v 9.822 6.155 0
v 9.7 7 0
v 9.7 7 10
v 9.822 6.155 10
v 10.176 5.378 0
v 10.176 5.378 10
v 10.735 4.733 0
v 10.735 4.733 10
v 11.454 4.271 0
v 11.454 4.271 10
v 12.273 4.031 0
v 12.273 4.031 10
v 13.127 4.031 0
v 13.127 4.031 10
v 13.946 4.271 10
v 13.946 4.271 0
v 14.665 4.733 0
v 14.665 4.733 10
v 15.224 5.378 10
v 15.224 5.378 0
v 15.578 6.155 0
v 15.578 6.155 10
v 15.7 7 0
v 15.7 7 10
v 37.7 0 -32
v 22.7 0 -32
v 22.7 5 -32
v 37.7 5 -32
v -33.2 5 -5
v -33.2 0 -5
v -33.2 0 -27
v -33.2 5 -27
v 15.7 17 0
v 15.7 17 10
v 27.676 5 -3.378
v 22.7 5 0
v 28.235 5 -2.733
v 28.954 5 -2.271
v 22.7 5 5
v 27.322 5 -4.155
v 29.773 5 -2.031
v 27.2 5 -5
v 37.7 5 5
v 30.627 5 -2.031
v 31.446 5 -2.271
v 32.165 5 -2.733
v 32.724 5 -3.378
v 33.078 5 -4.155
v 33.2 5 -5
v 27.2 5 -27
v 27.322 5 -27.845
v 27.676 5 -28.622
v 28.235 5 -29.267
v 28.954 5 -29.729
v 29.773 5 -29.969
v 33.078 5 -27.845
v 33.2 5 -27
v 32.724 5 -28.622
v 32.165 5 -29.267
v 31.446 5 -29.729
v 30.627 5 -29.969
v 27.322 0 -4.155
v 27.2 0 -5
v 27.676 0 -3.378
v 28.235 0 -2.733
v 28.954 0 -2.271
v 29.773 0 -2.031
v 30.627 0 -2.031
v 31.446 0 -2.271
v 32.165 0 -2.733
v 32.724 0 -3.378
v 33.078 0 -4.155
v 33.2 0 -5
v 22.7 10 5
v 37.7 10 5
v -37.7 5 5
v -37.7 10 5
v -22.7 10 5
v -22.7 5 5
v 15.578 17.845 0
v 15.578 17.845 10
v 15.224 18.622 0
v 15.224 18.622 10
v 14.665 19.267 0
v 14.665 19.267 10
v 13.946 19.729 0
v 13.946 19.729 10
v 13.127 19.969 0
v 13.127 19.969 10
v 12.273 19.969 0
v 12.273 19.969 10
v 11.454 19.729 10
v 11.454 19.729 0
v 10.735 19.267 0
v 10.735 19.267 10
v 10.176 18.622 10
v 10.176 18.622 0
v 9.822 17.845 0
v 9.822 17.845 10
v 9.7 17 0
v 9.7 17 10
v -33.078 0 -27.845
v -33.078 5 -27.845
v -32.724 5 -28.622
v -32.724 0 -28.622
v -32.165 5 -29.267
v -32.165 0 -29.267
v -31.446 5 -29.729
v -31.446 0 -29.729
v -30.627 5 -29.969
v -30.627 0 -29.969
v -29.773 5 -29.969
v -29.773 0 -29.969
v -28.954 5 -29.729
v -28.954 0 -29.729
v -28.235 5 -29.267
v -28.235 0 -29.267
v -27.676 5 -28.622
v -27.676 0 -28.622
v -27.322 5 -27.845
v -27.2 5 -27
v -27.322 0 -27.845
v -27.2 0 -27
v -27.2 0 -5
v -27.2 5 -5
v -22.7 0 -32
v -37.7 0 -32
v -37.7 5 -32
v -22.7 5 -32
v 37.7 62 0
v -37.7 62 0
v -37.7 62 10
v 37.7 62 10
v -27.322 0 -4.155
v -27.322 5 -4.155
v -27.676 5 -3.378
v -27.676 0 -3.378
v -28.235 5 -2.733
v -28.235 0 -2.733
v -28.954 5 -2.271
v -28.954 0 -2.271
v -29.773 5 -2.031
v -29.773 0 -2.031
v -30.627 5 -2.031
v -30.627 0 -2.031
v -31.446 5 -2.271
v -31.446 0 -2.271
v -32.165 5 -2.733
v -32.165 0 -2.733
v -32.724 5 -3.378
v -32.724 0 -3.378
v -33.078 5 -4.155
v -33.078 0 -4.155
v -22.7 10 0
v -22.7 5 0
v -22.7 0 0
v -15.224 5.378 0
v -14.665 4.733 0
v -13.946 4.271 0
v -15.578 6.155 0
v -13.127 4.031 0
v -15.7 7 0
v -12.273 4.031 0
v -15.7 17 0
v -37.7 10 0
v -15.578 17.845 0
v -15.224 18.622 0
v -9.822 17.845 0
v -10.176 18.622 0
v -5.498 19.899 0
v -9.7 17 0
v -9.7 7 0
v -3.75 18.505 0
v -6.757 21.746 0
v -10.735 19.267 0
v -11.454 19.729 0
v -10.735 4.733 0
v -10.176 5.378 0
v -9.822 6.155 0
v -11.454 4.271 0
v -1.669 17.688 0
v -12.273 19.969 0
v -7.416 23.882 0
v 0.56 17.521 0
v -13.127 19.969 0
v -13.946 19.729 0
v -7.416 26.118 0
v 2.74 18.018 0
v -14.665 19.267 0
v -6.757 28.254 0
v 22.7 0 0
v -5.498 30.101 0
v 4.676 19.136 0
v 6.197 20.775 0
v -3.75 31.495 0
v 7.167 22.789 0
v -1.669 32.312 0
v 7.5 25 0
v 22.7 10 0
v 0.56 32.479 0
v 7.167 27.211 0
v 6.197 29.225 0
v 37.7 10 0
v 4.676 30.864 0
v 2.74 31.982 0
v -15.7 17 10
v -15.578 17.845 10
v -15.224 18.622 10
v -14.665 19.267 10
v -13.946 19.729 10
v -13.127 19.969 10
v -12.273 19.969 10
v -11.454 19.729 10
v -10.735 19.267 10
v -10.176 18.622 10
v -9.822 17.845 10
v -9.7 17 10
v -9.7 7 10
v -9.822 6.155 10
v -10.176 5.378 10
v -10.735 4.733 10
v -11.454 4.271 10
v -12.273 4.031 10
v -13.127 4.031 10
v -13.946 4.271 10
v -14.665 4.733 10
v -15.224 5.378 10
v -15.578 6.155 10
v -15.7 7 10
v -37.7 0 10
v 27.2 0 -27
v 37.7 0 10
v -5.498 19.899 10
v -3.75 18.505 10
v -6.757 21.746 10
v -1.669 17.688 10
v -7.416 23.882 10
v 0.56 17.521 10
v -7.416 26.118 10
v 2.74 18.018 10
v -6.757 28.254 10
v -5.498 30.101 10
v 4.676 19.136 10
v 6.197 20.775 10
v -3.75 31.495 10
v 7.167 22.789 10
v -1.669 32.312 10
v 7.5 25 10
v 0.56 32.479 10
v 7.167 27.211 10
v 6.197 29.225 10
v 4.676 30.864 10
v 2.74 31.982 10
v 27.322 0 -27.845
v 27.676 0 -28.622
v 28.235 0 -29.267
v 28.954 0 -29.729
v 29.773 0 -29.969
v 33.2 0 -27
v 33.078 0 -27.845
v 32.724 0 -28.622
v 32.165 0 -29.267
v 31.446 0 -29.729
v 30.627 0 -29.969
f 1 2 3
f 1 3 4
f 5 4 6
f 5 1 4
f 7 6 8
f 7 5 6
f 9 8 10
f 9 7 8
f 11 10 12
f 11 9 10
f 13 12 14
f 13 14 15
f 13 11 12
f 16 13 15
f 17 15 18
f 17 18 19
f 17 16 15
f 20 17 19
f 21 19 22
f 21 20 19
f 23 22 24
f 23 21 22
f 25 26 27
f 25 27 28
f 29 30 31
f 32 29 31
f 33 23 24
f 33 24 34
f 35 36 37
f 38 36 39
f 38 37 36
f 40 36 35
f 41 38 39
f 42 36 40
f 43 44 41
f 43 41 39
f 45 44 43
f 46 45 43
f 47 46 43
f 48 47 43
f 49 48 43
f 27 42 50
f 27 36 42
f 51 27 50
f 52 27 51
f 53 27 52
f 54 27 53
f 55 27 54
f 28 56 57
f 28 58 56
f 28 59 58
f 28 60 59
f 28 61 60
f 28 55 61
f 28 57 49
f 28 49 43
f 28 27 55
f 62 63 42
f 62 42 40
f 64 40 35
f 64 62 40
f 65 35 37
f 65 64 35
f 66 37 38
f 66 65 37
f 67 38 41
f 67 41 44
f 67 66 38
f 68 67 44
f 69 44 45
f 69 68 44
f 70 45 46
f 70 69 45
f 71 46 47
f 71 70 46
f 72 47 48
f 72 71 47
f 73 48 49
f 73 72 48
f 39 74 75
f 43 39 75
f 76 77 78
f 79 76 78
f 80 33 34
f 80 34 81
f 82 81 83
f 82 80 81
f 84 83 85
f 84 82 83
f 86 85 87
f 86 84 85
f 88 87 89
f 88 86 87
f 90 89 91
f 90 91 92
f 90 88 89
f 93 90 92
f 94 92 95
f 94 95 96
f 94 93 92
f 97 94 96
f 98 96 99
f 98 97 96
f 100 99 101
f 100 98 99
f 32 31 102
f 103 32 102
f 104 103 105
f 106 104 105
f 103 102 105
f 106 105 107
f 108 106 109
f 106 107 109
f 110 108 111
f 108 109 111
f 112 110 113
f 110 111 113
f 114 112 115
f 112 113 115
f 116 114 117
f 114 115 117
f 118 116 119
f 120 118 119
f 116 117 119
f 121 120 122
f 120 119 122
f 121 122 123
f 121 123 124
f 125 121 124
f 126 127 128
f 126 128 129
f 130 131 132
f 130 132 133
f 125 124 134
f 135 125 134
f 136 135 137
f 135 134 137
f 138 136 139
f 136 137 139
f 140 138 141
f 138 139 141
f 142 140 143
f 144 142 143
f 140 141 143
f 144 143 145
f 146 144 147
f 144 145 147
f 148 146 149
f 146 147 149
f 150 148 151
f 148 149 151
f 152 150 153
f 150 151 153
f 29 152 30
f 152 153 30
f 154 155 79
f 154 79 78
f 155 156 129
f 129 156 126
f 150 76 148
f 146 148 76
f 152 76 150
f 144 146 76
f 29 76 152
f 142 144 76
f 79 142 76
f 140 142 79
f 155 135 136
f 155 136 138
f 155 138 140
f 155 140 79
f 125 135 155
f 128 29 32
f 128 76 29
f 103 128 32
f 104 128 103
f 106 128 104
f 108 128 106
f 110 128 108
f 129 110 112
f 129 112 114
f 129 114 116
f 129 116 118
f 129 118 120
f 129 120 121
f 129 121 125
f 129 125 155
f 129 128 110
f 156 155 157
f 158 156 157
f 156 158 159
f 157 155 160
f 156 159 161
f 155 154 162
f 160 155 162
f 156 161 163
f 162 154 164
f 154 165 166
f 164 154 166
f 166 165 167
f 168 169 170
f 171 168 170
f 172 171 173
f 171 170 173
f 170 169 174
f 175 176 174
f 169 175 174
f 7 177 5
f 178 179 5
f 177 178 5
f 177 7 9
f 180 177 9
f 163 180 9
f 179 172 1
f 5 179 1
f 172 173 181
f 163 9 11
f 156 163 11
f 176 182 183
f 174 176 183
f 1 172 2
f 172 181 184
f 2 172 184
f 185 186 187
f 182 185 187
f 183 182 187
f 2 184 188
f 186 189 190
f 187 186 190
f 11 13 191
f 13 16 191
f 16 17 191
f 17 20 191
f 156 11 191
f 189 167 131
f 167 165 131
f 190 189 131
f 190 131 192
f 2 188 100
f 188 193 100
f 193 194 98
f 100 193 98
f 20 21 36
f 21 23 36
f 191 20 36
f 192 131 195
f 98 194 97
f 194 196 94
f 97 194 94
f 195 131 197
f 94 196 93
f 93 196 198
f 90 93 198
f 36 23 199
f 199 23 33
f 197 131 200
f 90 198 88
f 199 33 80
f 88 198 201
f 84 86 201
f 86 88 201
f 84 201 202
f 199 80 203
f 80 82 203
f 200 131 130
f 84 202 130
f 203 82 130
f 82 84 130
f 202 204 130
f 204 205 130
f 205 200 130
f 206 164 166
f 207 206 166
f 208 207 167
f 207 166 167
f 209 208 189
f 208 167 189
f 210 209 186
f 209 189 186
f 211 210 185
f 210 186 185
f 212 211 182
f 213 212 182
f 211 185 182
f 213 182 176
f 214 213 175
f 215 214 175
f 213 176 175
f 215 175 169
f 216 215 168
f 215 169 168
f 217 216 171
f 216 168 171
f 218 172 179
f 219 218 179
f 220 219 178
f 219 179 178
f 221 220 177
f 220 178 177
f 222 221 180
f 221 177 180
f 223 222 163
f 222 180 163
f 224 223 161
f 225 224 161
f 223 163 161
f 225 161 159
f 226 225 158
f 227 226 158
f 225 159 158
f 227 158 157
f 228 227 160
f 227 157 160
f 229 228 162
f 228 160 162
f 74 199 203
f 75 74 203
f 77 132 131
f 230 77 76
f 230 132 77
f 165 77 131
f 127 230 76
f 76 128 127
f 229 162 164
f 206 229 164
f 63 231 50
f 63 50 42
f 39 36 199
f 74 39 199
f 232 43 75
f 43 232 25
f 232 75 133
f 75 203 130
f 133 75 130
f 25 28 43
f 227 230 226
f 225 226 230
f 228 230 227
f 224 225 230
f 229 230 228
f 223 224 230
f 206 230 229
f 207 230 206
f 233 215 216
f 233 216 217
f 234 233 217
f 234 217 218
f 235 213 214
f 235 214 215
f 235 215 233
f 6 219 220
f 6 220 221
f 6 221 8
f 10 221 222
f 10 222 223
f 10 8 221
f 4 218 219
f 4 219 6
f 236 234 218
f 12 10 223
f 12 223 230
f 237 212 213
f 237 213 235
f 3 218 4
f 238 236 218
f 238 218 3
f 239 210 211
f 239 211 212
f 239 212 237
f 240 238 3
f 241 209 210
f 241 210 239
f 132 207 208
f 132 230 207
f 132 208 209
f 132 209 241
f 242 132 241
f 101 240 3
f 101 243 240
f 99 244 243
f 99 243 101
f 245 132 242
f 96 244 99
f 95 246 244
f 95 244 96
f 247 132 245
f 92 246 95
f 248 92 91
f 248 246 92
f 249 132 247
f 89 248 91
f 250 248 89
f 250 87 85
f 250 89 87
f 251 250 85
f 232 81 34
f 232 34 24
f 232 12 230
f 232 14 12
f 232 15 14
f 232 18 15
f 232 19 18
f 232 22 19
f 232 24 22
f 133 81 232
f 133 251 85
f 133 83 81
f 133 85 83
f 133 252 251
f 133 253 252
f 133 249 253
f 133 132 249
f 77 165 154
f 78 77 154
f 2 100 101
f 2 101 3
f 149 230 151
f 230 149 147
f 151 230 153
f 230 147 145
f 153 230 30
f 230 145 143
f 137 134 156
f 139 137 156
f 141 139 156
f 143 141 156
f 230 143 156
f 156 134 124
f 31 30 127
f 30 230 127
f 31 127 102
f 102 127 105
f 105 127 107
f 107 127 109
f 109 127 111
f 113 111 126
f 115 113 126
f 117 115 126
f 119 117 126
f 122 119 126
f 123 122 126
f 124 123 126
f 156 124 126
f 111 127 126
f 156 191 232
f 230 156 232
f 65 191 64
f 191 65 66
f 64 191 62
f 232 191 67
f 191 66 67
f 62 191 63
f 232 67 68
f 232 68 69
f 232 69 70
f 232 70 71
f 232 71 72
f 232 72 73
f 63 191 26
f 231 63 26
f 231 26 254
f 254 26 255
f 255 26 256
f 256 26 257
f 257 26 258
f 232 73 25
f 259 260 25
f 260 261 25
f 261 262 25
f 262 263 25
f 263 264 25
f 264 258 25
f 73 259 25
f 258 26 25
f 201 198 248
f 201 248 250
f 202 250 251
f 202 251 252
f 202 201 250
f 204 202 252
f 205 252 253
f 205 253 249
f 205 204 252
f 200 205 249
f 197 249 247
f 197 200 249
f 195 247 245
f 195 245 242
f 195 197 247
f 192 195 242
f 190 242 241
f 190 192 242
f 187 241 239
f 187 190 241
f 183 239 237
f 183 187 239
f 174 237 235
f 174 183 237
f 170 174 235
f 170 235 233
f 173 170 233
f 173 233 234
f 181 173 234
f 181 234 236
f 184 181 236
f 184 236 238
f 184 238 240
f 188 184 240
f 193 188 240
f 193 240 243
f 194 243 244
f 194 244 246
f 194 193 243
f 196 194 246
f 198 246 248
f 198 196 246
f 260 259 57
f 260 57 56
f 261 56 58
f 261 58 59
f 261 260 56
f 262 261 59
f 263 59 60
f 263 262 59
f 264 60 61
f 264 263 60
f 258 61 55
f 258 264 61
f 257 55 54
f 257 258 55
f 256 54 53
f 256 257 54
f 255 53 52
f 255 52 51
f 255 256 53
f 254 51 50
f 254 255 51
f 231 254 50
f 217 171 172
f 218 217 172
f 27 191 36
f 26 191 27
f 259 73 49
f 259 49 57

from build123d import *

# Parameters (mm, degrees)
SKETCH1_W           = 75.4
SKETCH1_H           = 62
SKETCH1_R           = 7.5
BOSS_EXTRUDE1_DEPTH = 10
SKETCH2_W           = 15
SKETCH2_H           = 32
BOSS_EXTRUDE2_DEPTH = 5
SKETCH3_W           = 15
SKETCH3_H           = 5
CUT_EXTRUDE1_DEPTH  = 5


with BuildPart() as part:
    # Sketch1 → Boss-Extrude1 (new body)
    with BuildSketch(Plane.XY):
        with Locations((0, 31)):
            Rectangle(SKETCH1_W, SKETCH1_H)
        with Locations((0, 25)):
            Circle(SKETCH1_R, mode=Mode.SUBTRACT)
        with BuildLine():
            Line((-9.7, 17), (-9.7, 7))
            ThreePointArc((-9.7, 7), (-12.7, 4), (-15.7, 7))
            Line((-15.7, 7), (-15.7, 17))
            ThreePointArc((-15.7, 17), (-12.7, 20), (-9.7, 17))
        make_face(mode=Mode.SUBTRACT)
        with BuildLine():
            Line((9.7, 17), (9.7, 7))
            ThreePointArc((9.7, 7), (12.7, 4), (15.7, 7))
            Line((15.7, 7), (15.7, 17))
            ThreePointArc((15.7, 17), (12.7, 20), (9.7, 17))
        make_face(mode=Mode.SUBTRACT)
    extrude(amount=BOSS_EXTRUDE1_DEPTH)

    # Sketch2 → Boss-Extrude2 (add)
    # profile 1 of 2: a face of its own
    with BuildSketch(Plane(origin=(0, 0, 0), x_dir=(1, 0, 0), z_dir=(0, 1, 0))):
        with Locations((-30.2, 16)):
            Rectangle(SKETCH2_W, SKETCH2_H)
        with BuildLine():
            Line((-27.2, 27), (-27.2, 5))
            ThreePointArc((-27.2, 5), (-30.2, 2), (-33.2, 5))
            Line((-33.2, 5), (-33.2, 27))
            ThreePointArc((-33.2, 27), (-30.2, 30), (-27.2, 27))
        make_face(mode=Mode.SUBTRACT)
    # profile 2 of 2: a face of its own
    with BuildSketch(Plane(origin=(0, 0, 0), x_dir=(1, 0, 0), z_dir=(0, 1, 0))):
        with Locations((30.2, 16)):
            Rectangle(SKETCH2_W, SKETCH2_H)
        with BuildLine():
            Line((27.2, 27), (27.2, 5))
            ThreePointArc((27.2, 5), (30.2, 2), (33.2, 5))
            Line((33.2, 5), (33.2, 27))
            ThreePointArc((33.2, 27), (30.2, 30), (27.2, 27))
        make_face(mode=Mode.SUBTRACT)
    extrude(amount=BOSS_EXTRUDE2_DEPTH)

    # Sketch3 → Cut-Extrude1 (cut)
    with BuildSketch(Plane.XY):
        with Locations((-30.2, 7.5)):
            Rectangle(SKETCH3_W, SKETCH3_H)
        with Locations((30.2, 7.5)):
            Rectangle(SKETCH3_W, SKETCH3_H)
    extrude(amount=CUT_EXTRUDE1_DEPTH, mode=Mode.SUBTRACT)


solid = part.part
